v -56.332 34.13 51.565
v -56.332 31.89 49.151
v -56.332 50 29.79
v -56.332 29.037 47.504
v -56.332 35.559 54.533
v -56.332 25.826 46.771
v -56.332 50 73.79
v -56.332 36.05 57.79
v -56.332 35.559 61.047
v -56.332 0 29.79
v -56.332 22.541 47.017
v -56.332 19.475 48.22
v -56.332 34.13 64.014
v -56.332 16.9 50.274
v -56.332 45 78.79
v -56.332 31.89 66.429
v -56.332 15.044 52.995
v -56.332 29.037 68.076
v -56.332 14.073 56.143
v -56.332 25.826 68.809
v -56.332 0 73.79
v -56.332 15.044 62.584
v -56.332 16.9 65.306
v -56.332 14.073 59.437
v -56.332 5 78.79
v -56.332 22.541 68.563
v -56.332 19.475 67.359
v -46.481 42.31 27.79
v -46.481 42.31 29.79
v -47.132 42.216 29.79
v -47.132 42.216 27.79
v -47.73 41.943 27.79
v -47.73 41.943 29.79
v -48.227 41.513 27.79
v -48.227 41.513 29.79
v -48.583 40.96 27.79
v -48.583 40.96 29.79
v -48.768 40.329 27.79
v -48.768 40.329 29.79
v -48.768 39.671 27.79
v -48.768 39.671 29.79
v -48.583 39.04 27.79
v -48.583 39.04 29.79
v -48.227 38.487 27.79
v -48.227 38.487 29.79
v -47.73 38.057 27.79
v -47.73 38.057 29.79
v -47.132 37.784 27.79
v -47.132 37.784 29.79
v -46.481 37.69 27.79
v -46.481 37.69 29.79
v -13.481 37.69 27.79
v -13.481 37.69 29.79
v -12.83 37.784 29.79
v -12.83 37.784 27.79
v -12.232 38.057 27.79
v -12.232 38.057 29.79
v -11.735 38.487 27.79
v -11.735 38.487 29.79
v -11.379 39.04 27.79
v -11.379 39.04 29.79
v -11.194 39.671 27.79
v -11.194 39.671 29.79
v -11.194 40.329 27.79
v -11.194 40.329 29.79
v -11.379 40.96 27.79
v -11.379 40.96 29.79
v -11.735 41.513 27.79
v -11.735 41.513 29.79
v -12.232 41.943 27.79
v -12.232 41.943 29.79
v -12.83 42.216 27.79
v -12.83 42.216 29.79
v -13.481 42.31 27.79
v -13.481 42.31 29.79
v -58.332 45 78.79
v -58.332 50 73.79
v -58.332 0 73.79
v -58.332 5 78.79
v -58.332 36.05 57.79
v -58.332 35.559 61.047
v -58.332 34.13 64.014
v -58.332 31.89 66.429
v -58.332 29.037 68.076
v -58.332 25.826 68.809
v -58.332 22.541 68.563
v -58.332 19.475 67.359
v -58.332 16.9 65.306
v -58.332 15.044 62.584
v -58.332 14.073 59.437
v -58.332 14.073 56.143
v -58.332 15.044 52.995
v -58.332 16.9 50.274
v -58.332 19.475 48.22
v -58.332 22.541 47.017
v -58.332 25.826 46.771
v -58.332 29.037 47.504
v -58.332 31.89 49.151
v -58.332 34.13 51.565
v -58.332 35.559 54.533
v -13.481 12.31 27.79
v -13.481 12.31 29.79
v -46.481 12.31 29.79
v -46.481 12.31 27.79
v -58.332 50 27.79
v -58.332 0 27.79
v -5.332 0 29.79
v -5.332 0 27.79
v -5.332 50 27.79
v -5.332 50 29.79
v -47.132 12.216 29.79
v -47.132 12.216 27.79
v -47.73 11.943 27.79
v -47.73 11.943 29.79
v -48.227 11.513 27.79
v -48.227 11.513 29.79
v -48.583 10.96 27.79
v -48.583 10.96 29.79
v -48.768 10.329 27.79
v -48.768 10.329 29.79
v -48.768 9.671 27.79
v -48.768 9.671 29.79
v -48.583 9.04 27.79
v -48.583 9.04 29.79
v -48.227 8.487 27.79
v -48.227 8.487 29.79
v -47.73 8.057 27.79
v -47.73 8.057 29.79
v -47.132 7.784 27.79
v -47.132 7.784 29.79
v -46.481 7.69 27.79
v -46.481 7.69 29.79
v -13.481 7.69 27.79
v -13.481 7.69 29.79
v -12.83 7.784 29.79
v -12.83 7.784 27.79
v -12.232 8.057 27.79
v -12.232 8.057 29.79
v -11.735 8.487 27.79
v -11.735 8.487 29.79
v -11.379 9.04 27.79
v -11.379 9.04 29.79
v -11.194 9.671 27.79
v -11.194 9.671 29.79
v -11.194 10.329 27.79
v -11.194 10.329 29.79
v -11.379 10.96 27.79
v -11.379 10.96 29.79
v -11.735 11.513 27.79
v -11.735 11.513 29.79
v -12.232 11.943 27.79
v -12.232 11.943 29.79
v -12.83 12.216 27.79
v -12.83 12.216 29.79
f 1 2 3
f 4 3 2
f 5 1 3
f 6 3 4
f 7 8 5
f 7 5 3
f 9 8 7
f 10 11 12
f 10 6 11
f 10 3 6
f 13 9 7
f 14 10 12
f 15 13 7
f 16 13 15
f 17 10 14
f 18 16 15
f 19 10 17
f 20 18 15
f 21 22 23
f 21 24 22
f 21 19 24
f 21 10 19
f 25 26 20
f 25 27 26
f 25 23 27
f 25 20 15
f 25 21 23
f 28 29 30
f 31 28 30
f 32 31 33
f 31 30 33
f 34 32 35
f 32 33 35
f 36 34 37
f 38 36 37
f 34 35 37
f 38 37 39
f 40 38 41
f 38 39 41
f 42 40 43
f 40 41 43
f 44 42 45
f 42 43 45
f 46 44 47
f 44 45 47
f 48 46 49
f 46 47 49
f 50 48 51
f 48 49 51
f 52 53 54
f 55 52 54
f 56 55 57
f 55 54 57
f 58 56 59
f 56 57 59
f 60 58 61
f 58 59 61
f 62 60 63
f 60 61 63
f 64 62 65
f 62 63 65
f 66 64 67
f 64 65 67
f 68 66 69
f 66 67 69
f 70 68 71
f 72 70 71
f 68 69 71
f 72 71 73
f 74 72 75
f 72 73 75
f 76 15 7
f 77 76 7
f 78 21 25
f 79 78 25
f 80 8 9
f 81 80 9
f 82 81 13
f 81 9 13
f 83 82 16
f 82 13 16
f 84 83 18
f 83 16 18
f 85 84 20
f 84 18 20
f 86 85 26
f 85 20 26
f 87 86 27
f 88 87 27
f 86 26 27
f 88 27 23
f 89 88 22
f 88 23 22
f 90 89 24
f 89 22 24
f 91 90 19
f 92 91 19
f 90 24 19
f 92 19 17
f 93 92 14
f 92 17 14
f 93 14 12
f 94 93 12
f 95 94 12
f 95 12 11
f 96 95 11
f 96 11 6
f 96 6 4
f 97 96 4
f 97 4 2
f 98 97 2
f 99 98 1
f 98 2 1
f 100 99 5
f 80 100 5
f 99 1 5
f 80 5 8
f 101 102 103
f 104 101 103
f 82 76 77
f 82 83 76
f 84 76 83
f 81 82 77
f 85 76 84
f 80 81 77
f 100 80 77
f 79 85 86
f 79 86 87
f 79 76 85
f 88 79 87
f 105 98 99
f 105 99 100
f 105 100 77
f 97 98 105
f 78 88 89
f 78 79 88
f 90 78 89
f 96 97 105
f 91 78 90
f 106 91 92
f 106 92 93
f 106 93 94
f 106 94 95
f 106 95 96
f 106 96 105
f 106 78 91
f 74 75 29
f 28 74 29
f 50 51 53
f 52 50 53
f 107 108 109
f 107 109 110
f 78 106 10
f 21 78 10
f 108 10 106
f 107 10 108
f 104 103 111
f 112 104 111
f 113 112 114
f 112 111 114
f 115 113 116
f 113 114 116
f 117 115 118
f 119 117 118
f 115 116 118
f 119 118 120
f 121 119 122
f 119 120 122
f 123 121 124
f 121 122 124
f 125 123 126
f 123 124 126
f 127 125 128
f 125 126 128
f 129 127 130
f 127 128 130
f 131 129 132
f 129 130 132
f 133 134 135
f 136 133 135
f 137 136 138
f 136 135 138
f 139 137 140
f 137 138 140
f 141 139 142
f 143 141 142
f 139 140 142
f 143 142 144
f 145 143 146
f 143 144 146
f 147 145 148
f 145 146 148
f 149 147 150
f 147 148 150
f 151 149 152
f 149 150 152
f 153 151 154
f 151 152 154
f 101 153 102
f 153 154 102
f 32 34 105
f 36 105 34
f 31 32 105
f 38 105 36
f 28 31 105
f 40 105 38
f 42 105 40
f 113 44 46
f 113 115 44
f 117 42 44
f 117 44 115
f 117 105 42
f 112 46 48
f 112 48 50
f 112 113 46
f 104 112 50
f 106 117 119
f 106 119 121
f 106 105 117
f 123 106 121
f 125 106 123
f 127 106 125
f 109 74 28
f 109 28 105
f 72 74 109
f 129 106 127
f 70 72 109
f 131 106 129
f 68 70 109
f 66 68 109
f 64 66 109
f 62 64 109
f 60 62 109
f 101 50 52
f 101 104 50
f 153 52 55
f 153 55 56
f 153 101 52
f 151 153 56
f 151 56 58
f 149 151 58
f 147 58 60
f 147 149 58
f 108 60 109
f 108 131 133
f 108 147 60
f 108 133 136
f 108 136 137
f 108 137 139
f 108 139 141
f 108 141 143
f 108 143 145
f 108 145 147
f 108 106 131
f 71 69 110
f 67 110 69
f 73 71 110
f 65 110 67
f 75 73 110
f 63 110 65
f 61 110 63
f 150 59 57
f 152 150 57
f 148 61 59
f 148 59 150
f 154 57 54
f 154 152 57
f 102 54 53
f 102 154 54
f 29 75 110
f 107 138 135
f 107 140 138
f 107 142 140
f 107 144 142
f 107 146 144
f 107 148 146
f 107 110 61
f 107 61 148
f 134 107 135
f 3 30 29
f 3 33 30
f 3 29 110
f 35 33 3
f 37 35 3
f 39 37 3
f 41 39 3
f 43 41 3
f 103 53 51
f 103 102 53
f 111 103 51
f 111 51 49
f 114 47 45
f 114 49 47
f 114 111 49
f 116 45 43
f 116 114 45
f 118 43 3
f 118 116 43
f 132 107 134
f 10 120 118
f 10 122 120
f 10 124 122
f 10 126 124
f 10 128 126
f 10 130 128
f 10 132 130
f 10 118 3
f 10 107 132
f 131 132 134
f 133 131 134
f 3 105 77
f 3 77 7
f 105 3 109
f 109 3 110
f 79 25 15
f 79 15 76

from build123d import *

# Parameters (mm, degrees)
F1_DEPTH = 50
F2_R     = 11.05
F3_DEPTH = 2
F5_DEPTH = 2


with BuildPart() as f1:
    # F0 (on Front) → F1 (new body)
    with BuildSketch(Plane.XZ):
        Polygon((-56.332381, 78.789798), (-58.332381, 78.789798), (-58.332381, 27.789798), (-5.332381, 27.789798), (-5.332381, 29.789798), (-56.332381, 29.789798), align=None)
    extrude(amount=-F1_DEPTH)

    # F2 (on face) → F3 (cut)
    with BuildSketch(Plane.YZ.offset(-56.332381)):
        with Locations((25, 57.789798)):
            Circle(F2_R)
        Polygon((0, 78.789798), (0, 73.789798), (5, 78.789798), align=None)
        Polygon((50, 78.789798), (45, 78.789798), (50, 73.789798), align=None)
    extrude(amount=-F3_DEPTH, mode=Mode.SUBTRACT)

    # F4 (on face) → F5 (cut)
    with BuildSketch(Plane.XY.offset(29.789798)):
        with BuildLine():
            ThreePointArc((-46.481331, 12.310056), (-48.791387, 10), (-46.481331, 7.689944))
            Line((-46.481331, 7.689944), (-13.480531, 7.689944))
            ThreePointArc((-13.480531, 7.689944), (-11.170475, 10), (-13.480531, 12.310056))
            Line((-13.480531, 12.310056), (-46.481331, 12.310056))
        make_face()
        with BuildLine():
            ThreePointArc((-46.481331, 42.310056), (-48.791387, 40), (-46.481331, 37.689944))
            Line((-46.481331, 37.689944), (-13.480531, 37.689944))
            ThreePointArc((-13.480531, 37.689944), (-11.170475, 40), (-13.480531, 42.310056))
            Line((-13.480531, 42.310056), (-46.481331, 42.310056))
        make_face()
    extrude(amount=-F5_DEPTH, mode=Mode.SUBTRACT)


solid = f1.part
